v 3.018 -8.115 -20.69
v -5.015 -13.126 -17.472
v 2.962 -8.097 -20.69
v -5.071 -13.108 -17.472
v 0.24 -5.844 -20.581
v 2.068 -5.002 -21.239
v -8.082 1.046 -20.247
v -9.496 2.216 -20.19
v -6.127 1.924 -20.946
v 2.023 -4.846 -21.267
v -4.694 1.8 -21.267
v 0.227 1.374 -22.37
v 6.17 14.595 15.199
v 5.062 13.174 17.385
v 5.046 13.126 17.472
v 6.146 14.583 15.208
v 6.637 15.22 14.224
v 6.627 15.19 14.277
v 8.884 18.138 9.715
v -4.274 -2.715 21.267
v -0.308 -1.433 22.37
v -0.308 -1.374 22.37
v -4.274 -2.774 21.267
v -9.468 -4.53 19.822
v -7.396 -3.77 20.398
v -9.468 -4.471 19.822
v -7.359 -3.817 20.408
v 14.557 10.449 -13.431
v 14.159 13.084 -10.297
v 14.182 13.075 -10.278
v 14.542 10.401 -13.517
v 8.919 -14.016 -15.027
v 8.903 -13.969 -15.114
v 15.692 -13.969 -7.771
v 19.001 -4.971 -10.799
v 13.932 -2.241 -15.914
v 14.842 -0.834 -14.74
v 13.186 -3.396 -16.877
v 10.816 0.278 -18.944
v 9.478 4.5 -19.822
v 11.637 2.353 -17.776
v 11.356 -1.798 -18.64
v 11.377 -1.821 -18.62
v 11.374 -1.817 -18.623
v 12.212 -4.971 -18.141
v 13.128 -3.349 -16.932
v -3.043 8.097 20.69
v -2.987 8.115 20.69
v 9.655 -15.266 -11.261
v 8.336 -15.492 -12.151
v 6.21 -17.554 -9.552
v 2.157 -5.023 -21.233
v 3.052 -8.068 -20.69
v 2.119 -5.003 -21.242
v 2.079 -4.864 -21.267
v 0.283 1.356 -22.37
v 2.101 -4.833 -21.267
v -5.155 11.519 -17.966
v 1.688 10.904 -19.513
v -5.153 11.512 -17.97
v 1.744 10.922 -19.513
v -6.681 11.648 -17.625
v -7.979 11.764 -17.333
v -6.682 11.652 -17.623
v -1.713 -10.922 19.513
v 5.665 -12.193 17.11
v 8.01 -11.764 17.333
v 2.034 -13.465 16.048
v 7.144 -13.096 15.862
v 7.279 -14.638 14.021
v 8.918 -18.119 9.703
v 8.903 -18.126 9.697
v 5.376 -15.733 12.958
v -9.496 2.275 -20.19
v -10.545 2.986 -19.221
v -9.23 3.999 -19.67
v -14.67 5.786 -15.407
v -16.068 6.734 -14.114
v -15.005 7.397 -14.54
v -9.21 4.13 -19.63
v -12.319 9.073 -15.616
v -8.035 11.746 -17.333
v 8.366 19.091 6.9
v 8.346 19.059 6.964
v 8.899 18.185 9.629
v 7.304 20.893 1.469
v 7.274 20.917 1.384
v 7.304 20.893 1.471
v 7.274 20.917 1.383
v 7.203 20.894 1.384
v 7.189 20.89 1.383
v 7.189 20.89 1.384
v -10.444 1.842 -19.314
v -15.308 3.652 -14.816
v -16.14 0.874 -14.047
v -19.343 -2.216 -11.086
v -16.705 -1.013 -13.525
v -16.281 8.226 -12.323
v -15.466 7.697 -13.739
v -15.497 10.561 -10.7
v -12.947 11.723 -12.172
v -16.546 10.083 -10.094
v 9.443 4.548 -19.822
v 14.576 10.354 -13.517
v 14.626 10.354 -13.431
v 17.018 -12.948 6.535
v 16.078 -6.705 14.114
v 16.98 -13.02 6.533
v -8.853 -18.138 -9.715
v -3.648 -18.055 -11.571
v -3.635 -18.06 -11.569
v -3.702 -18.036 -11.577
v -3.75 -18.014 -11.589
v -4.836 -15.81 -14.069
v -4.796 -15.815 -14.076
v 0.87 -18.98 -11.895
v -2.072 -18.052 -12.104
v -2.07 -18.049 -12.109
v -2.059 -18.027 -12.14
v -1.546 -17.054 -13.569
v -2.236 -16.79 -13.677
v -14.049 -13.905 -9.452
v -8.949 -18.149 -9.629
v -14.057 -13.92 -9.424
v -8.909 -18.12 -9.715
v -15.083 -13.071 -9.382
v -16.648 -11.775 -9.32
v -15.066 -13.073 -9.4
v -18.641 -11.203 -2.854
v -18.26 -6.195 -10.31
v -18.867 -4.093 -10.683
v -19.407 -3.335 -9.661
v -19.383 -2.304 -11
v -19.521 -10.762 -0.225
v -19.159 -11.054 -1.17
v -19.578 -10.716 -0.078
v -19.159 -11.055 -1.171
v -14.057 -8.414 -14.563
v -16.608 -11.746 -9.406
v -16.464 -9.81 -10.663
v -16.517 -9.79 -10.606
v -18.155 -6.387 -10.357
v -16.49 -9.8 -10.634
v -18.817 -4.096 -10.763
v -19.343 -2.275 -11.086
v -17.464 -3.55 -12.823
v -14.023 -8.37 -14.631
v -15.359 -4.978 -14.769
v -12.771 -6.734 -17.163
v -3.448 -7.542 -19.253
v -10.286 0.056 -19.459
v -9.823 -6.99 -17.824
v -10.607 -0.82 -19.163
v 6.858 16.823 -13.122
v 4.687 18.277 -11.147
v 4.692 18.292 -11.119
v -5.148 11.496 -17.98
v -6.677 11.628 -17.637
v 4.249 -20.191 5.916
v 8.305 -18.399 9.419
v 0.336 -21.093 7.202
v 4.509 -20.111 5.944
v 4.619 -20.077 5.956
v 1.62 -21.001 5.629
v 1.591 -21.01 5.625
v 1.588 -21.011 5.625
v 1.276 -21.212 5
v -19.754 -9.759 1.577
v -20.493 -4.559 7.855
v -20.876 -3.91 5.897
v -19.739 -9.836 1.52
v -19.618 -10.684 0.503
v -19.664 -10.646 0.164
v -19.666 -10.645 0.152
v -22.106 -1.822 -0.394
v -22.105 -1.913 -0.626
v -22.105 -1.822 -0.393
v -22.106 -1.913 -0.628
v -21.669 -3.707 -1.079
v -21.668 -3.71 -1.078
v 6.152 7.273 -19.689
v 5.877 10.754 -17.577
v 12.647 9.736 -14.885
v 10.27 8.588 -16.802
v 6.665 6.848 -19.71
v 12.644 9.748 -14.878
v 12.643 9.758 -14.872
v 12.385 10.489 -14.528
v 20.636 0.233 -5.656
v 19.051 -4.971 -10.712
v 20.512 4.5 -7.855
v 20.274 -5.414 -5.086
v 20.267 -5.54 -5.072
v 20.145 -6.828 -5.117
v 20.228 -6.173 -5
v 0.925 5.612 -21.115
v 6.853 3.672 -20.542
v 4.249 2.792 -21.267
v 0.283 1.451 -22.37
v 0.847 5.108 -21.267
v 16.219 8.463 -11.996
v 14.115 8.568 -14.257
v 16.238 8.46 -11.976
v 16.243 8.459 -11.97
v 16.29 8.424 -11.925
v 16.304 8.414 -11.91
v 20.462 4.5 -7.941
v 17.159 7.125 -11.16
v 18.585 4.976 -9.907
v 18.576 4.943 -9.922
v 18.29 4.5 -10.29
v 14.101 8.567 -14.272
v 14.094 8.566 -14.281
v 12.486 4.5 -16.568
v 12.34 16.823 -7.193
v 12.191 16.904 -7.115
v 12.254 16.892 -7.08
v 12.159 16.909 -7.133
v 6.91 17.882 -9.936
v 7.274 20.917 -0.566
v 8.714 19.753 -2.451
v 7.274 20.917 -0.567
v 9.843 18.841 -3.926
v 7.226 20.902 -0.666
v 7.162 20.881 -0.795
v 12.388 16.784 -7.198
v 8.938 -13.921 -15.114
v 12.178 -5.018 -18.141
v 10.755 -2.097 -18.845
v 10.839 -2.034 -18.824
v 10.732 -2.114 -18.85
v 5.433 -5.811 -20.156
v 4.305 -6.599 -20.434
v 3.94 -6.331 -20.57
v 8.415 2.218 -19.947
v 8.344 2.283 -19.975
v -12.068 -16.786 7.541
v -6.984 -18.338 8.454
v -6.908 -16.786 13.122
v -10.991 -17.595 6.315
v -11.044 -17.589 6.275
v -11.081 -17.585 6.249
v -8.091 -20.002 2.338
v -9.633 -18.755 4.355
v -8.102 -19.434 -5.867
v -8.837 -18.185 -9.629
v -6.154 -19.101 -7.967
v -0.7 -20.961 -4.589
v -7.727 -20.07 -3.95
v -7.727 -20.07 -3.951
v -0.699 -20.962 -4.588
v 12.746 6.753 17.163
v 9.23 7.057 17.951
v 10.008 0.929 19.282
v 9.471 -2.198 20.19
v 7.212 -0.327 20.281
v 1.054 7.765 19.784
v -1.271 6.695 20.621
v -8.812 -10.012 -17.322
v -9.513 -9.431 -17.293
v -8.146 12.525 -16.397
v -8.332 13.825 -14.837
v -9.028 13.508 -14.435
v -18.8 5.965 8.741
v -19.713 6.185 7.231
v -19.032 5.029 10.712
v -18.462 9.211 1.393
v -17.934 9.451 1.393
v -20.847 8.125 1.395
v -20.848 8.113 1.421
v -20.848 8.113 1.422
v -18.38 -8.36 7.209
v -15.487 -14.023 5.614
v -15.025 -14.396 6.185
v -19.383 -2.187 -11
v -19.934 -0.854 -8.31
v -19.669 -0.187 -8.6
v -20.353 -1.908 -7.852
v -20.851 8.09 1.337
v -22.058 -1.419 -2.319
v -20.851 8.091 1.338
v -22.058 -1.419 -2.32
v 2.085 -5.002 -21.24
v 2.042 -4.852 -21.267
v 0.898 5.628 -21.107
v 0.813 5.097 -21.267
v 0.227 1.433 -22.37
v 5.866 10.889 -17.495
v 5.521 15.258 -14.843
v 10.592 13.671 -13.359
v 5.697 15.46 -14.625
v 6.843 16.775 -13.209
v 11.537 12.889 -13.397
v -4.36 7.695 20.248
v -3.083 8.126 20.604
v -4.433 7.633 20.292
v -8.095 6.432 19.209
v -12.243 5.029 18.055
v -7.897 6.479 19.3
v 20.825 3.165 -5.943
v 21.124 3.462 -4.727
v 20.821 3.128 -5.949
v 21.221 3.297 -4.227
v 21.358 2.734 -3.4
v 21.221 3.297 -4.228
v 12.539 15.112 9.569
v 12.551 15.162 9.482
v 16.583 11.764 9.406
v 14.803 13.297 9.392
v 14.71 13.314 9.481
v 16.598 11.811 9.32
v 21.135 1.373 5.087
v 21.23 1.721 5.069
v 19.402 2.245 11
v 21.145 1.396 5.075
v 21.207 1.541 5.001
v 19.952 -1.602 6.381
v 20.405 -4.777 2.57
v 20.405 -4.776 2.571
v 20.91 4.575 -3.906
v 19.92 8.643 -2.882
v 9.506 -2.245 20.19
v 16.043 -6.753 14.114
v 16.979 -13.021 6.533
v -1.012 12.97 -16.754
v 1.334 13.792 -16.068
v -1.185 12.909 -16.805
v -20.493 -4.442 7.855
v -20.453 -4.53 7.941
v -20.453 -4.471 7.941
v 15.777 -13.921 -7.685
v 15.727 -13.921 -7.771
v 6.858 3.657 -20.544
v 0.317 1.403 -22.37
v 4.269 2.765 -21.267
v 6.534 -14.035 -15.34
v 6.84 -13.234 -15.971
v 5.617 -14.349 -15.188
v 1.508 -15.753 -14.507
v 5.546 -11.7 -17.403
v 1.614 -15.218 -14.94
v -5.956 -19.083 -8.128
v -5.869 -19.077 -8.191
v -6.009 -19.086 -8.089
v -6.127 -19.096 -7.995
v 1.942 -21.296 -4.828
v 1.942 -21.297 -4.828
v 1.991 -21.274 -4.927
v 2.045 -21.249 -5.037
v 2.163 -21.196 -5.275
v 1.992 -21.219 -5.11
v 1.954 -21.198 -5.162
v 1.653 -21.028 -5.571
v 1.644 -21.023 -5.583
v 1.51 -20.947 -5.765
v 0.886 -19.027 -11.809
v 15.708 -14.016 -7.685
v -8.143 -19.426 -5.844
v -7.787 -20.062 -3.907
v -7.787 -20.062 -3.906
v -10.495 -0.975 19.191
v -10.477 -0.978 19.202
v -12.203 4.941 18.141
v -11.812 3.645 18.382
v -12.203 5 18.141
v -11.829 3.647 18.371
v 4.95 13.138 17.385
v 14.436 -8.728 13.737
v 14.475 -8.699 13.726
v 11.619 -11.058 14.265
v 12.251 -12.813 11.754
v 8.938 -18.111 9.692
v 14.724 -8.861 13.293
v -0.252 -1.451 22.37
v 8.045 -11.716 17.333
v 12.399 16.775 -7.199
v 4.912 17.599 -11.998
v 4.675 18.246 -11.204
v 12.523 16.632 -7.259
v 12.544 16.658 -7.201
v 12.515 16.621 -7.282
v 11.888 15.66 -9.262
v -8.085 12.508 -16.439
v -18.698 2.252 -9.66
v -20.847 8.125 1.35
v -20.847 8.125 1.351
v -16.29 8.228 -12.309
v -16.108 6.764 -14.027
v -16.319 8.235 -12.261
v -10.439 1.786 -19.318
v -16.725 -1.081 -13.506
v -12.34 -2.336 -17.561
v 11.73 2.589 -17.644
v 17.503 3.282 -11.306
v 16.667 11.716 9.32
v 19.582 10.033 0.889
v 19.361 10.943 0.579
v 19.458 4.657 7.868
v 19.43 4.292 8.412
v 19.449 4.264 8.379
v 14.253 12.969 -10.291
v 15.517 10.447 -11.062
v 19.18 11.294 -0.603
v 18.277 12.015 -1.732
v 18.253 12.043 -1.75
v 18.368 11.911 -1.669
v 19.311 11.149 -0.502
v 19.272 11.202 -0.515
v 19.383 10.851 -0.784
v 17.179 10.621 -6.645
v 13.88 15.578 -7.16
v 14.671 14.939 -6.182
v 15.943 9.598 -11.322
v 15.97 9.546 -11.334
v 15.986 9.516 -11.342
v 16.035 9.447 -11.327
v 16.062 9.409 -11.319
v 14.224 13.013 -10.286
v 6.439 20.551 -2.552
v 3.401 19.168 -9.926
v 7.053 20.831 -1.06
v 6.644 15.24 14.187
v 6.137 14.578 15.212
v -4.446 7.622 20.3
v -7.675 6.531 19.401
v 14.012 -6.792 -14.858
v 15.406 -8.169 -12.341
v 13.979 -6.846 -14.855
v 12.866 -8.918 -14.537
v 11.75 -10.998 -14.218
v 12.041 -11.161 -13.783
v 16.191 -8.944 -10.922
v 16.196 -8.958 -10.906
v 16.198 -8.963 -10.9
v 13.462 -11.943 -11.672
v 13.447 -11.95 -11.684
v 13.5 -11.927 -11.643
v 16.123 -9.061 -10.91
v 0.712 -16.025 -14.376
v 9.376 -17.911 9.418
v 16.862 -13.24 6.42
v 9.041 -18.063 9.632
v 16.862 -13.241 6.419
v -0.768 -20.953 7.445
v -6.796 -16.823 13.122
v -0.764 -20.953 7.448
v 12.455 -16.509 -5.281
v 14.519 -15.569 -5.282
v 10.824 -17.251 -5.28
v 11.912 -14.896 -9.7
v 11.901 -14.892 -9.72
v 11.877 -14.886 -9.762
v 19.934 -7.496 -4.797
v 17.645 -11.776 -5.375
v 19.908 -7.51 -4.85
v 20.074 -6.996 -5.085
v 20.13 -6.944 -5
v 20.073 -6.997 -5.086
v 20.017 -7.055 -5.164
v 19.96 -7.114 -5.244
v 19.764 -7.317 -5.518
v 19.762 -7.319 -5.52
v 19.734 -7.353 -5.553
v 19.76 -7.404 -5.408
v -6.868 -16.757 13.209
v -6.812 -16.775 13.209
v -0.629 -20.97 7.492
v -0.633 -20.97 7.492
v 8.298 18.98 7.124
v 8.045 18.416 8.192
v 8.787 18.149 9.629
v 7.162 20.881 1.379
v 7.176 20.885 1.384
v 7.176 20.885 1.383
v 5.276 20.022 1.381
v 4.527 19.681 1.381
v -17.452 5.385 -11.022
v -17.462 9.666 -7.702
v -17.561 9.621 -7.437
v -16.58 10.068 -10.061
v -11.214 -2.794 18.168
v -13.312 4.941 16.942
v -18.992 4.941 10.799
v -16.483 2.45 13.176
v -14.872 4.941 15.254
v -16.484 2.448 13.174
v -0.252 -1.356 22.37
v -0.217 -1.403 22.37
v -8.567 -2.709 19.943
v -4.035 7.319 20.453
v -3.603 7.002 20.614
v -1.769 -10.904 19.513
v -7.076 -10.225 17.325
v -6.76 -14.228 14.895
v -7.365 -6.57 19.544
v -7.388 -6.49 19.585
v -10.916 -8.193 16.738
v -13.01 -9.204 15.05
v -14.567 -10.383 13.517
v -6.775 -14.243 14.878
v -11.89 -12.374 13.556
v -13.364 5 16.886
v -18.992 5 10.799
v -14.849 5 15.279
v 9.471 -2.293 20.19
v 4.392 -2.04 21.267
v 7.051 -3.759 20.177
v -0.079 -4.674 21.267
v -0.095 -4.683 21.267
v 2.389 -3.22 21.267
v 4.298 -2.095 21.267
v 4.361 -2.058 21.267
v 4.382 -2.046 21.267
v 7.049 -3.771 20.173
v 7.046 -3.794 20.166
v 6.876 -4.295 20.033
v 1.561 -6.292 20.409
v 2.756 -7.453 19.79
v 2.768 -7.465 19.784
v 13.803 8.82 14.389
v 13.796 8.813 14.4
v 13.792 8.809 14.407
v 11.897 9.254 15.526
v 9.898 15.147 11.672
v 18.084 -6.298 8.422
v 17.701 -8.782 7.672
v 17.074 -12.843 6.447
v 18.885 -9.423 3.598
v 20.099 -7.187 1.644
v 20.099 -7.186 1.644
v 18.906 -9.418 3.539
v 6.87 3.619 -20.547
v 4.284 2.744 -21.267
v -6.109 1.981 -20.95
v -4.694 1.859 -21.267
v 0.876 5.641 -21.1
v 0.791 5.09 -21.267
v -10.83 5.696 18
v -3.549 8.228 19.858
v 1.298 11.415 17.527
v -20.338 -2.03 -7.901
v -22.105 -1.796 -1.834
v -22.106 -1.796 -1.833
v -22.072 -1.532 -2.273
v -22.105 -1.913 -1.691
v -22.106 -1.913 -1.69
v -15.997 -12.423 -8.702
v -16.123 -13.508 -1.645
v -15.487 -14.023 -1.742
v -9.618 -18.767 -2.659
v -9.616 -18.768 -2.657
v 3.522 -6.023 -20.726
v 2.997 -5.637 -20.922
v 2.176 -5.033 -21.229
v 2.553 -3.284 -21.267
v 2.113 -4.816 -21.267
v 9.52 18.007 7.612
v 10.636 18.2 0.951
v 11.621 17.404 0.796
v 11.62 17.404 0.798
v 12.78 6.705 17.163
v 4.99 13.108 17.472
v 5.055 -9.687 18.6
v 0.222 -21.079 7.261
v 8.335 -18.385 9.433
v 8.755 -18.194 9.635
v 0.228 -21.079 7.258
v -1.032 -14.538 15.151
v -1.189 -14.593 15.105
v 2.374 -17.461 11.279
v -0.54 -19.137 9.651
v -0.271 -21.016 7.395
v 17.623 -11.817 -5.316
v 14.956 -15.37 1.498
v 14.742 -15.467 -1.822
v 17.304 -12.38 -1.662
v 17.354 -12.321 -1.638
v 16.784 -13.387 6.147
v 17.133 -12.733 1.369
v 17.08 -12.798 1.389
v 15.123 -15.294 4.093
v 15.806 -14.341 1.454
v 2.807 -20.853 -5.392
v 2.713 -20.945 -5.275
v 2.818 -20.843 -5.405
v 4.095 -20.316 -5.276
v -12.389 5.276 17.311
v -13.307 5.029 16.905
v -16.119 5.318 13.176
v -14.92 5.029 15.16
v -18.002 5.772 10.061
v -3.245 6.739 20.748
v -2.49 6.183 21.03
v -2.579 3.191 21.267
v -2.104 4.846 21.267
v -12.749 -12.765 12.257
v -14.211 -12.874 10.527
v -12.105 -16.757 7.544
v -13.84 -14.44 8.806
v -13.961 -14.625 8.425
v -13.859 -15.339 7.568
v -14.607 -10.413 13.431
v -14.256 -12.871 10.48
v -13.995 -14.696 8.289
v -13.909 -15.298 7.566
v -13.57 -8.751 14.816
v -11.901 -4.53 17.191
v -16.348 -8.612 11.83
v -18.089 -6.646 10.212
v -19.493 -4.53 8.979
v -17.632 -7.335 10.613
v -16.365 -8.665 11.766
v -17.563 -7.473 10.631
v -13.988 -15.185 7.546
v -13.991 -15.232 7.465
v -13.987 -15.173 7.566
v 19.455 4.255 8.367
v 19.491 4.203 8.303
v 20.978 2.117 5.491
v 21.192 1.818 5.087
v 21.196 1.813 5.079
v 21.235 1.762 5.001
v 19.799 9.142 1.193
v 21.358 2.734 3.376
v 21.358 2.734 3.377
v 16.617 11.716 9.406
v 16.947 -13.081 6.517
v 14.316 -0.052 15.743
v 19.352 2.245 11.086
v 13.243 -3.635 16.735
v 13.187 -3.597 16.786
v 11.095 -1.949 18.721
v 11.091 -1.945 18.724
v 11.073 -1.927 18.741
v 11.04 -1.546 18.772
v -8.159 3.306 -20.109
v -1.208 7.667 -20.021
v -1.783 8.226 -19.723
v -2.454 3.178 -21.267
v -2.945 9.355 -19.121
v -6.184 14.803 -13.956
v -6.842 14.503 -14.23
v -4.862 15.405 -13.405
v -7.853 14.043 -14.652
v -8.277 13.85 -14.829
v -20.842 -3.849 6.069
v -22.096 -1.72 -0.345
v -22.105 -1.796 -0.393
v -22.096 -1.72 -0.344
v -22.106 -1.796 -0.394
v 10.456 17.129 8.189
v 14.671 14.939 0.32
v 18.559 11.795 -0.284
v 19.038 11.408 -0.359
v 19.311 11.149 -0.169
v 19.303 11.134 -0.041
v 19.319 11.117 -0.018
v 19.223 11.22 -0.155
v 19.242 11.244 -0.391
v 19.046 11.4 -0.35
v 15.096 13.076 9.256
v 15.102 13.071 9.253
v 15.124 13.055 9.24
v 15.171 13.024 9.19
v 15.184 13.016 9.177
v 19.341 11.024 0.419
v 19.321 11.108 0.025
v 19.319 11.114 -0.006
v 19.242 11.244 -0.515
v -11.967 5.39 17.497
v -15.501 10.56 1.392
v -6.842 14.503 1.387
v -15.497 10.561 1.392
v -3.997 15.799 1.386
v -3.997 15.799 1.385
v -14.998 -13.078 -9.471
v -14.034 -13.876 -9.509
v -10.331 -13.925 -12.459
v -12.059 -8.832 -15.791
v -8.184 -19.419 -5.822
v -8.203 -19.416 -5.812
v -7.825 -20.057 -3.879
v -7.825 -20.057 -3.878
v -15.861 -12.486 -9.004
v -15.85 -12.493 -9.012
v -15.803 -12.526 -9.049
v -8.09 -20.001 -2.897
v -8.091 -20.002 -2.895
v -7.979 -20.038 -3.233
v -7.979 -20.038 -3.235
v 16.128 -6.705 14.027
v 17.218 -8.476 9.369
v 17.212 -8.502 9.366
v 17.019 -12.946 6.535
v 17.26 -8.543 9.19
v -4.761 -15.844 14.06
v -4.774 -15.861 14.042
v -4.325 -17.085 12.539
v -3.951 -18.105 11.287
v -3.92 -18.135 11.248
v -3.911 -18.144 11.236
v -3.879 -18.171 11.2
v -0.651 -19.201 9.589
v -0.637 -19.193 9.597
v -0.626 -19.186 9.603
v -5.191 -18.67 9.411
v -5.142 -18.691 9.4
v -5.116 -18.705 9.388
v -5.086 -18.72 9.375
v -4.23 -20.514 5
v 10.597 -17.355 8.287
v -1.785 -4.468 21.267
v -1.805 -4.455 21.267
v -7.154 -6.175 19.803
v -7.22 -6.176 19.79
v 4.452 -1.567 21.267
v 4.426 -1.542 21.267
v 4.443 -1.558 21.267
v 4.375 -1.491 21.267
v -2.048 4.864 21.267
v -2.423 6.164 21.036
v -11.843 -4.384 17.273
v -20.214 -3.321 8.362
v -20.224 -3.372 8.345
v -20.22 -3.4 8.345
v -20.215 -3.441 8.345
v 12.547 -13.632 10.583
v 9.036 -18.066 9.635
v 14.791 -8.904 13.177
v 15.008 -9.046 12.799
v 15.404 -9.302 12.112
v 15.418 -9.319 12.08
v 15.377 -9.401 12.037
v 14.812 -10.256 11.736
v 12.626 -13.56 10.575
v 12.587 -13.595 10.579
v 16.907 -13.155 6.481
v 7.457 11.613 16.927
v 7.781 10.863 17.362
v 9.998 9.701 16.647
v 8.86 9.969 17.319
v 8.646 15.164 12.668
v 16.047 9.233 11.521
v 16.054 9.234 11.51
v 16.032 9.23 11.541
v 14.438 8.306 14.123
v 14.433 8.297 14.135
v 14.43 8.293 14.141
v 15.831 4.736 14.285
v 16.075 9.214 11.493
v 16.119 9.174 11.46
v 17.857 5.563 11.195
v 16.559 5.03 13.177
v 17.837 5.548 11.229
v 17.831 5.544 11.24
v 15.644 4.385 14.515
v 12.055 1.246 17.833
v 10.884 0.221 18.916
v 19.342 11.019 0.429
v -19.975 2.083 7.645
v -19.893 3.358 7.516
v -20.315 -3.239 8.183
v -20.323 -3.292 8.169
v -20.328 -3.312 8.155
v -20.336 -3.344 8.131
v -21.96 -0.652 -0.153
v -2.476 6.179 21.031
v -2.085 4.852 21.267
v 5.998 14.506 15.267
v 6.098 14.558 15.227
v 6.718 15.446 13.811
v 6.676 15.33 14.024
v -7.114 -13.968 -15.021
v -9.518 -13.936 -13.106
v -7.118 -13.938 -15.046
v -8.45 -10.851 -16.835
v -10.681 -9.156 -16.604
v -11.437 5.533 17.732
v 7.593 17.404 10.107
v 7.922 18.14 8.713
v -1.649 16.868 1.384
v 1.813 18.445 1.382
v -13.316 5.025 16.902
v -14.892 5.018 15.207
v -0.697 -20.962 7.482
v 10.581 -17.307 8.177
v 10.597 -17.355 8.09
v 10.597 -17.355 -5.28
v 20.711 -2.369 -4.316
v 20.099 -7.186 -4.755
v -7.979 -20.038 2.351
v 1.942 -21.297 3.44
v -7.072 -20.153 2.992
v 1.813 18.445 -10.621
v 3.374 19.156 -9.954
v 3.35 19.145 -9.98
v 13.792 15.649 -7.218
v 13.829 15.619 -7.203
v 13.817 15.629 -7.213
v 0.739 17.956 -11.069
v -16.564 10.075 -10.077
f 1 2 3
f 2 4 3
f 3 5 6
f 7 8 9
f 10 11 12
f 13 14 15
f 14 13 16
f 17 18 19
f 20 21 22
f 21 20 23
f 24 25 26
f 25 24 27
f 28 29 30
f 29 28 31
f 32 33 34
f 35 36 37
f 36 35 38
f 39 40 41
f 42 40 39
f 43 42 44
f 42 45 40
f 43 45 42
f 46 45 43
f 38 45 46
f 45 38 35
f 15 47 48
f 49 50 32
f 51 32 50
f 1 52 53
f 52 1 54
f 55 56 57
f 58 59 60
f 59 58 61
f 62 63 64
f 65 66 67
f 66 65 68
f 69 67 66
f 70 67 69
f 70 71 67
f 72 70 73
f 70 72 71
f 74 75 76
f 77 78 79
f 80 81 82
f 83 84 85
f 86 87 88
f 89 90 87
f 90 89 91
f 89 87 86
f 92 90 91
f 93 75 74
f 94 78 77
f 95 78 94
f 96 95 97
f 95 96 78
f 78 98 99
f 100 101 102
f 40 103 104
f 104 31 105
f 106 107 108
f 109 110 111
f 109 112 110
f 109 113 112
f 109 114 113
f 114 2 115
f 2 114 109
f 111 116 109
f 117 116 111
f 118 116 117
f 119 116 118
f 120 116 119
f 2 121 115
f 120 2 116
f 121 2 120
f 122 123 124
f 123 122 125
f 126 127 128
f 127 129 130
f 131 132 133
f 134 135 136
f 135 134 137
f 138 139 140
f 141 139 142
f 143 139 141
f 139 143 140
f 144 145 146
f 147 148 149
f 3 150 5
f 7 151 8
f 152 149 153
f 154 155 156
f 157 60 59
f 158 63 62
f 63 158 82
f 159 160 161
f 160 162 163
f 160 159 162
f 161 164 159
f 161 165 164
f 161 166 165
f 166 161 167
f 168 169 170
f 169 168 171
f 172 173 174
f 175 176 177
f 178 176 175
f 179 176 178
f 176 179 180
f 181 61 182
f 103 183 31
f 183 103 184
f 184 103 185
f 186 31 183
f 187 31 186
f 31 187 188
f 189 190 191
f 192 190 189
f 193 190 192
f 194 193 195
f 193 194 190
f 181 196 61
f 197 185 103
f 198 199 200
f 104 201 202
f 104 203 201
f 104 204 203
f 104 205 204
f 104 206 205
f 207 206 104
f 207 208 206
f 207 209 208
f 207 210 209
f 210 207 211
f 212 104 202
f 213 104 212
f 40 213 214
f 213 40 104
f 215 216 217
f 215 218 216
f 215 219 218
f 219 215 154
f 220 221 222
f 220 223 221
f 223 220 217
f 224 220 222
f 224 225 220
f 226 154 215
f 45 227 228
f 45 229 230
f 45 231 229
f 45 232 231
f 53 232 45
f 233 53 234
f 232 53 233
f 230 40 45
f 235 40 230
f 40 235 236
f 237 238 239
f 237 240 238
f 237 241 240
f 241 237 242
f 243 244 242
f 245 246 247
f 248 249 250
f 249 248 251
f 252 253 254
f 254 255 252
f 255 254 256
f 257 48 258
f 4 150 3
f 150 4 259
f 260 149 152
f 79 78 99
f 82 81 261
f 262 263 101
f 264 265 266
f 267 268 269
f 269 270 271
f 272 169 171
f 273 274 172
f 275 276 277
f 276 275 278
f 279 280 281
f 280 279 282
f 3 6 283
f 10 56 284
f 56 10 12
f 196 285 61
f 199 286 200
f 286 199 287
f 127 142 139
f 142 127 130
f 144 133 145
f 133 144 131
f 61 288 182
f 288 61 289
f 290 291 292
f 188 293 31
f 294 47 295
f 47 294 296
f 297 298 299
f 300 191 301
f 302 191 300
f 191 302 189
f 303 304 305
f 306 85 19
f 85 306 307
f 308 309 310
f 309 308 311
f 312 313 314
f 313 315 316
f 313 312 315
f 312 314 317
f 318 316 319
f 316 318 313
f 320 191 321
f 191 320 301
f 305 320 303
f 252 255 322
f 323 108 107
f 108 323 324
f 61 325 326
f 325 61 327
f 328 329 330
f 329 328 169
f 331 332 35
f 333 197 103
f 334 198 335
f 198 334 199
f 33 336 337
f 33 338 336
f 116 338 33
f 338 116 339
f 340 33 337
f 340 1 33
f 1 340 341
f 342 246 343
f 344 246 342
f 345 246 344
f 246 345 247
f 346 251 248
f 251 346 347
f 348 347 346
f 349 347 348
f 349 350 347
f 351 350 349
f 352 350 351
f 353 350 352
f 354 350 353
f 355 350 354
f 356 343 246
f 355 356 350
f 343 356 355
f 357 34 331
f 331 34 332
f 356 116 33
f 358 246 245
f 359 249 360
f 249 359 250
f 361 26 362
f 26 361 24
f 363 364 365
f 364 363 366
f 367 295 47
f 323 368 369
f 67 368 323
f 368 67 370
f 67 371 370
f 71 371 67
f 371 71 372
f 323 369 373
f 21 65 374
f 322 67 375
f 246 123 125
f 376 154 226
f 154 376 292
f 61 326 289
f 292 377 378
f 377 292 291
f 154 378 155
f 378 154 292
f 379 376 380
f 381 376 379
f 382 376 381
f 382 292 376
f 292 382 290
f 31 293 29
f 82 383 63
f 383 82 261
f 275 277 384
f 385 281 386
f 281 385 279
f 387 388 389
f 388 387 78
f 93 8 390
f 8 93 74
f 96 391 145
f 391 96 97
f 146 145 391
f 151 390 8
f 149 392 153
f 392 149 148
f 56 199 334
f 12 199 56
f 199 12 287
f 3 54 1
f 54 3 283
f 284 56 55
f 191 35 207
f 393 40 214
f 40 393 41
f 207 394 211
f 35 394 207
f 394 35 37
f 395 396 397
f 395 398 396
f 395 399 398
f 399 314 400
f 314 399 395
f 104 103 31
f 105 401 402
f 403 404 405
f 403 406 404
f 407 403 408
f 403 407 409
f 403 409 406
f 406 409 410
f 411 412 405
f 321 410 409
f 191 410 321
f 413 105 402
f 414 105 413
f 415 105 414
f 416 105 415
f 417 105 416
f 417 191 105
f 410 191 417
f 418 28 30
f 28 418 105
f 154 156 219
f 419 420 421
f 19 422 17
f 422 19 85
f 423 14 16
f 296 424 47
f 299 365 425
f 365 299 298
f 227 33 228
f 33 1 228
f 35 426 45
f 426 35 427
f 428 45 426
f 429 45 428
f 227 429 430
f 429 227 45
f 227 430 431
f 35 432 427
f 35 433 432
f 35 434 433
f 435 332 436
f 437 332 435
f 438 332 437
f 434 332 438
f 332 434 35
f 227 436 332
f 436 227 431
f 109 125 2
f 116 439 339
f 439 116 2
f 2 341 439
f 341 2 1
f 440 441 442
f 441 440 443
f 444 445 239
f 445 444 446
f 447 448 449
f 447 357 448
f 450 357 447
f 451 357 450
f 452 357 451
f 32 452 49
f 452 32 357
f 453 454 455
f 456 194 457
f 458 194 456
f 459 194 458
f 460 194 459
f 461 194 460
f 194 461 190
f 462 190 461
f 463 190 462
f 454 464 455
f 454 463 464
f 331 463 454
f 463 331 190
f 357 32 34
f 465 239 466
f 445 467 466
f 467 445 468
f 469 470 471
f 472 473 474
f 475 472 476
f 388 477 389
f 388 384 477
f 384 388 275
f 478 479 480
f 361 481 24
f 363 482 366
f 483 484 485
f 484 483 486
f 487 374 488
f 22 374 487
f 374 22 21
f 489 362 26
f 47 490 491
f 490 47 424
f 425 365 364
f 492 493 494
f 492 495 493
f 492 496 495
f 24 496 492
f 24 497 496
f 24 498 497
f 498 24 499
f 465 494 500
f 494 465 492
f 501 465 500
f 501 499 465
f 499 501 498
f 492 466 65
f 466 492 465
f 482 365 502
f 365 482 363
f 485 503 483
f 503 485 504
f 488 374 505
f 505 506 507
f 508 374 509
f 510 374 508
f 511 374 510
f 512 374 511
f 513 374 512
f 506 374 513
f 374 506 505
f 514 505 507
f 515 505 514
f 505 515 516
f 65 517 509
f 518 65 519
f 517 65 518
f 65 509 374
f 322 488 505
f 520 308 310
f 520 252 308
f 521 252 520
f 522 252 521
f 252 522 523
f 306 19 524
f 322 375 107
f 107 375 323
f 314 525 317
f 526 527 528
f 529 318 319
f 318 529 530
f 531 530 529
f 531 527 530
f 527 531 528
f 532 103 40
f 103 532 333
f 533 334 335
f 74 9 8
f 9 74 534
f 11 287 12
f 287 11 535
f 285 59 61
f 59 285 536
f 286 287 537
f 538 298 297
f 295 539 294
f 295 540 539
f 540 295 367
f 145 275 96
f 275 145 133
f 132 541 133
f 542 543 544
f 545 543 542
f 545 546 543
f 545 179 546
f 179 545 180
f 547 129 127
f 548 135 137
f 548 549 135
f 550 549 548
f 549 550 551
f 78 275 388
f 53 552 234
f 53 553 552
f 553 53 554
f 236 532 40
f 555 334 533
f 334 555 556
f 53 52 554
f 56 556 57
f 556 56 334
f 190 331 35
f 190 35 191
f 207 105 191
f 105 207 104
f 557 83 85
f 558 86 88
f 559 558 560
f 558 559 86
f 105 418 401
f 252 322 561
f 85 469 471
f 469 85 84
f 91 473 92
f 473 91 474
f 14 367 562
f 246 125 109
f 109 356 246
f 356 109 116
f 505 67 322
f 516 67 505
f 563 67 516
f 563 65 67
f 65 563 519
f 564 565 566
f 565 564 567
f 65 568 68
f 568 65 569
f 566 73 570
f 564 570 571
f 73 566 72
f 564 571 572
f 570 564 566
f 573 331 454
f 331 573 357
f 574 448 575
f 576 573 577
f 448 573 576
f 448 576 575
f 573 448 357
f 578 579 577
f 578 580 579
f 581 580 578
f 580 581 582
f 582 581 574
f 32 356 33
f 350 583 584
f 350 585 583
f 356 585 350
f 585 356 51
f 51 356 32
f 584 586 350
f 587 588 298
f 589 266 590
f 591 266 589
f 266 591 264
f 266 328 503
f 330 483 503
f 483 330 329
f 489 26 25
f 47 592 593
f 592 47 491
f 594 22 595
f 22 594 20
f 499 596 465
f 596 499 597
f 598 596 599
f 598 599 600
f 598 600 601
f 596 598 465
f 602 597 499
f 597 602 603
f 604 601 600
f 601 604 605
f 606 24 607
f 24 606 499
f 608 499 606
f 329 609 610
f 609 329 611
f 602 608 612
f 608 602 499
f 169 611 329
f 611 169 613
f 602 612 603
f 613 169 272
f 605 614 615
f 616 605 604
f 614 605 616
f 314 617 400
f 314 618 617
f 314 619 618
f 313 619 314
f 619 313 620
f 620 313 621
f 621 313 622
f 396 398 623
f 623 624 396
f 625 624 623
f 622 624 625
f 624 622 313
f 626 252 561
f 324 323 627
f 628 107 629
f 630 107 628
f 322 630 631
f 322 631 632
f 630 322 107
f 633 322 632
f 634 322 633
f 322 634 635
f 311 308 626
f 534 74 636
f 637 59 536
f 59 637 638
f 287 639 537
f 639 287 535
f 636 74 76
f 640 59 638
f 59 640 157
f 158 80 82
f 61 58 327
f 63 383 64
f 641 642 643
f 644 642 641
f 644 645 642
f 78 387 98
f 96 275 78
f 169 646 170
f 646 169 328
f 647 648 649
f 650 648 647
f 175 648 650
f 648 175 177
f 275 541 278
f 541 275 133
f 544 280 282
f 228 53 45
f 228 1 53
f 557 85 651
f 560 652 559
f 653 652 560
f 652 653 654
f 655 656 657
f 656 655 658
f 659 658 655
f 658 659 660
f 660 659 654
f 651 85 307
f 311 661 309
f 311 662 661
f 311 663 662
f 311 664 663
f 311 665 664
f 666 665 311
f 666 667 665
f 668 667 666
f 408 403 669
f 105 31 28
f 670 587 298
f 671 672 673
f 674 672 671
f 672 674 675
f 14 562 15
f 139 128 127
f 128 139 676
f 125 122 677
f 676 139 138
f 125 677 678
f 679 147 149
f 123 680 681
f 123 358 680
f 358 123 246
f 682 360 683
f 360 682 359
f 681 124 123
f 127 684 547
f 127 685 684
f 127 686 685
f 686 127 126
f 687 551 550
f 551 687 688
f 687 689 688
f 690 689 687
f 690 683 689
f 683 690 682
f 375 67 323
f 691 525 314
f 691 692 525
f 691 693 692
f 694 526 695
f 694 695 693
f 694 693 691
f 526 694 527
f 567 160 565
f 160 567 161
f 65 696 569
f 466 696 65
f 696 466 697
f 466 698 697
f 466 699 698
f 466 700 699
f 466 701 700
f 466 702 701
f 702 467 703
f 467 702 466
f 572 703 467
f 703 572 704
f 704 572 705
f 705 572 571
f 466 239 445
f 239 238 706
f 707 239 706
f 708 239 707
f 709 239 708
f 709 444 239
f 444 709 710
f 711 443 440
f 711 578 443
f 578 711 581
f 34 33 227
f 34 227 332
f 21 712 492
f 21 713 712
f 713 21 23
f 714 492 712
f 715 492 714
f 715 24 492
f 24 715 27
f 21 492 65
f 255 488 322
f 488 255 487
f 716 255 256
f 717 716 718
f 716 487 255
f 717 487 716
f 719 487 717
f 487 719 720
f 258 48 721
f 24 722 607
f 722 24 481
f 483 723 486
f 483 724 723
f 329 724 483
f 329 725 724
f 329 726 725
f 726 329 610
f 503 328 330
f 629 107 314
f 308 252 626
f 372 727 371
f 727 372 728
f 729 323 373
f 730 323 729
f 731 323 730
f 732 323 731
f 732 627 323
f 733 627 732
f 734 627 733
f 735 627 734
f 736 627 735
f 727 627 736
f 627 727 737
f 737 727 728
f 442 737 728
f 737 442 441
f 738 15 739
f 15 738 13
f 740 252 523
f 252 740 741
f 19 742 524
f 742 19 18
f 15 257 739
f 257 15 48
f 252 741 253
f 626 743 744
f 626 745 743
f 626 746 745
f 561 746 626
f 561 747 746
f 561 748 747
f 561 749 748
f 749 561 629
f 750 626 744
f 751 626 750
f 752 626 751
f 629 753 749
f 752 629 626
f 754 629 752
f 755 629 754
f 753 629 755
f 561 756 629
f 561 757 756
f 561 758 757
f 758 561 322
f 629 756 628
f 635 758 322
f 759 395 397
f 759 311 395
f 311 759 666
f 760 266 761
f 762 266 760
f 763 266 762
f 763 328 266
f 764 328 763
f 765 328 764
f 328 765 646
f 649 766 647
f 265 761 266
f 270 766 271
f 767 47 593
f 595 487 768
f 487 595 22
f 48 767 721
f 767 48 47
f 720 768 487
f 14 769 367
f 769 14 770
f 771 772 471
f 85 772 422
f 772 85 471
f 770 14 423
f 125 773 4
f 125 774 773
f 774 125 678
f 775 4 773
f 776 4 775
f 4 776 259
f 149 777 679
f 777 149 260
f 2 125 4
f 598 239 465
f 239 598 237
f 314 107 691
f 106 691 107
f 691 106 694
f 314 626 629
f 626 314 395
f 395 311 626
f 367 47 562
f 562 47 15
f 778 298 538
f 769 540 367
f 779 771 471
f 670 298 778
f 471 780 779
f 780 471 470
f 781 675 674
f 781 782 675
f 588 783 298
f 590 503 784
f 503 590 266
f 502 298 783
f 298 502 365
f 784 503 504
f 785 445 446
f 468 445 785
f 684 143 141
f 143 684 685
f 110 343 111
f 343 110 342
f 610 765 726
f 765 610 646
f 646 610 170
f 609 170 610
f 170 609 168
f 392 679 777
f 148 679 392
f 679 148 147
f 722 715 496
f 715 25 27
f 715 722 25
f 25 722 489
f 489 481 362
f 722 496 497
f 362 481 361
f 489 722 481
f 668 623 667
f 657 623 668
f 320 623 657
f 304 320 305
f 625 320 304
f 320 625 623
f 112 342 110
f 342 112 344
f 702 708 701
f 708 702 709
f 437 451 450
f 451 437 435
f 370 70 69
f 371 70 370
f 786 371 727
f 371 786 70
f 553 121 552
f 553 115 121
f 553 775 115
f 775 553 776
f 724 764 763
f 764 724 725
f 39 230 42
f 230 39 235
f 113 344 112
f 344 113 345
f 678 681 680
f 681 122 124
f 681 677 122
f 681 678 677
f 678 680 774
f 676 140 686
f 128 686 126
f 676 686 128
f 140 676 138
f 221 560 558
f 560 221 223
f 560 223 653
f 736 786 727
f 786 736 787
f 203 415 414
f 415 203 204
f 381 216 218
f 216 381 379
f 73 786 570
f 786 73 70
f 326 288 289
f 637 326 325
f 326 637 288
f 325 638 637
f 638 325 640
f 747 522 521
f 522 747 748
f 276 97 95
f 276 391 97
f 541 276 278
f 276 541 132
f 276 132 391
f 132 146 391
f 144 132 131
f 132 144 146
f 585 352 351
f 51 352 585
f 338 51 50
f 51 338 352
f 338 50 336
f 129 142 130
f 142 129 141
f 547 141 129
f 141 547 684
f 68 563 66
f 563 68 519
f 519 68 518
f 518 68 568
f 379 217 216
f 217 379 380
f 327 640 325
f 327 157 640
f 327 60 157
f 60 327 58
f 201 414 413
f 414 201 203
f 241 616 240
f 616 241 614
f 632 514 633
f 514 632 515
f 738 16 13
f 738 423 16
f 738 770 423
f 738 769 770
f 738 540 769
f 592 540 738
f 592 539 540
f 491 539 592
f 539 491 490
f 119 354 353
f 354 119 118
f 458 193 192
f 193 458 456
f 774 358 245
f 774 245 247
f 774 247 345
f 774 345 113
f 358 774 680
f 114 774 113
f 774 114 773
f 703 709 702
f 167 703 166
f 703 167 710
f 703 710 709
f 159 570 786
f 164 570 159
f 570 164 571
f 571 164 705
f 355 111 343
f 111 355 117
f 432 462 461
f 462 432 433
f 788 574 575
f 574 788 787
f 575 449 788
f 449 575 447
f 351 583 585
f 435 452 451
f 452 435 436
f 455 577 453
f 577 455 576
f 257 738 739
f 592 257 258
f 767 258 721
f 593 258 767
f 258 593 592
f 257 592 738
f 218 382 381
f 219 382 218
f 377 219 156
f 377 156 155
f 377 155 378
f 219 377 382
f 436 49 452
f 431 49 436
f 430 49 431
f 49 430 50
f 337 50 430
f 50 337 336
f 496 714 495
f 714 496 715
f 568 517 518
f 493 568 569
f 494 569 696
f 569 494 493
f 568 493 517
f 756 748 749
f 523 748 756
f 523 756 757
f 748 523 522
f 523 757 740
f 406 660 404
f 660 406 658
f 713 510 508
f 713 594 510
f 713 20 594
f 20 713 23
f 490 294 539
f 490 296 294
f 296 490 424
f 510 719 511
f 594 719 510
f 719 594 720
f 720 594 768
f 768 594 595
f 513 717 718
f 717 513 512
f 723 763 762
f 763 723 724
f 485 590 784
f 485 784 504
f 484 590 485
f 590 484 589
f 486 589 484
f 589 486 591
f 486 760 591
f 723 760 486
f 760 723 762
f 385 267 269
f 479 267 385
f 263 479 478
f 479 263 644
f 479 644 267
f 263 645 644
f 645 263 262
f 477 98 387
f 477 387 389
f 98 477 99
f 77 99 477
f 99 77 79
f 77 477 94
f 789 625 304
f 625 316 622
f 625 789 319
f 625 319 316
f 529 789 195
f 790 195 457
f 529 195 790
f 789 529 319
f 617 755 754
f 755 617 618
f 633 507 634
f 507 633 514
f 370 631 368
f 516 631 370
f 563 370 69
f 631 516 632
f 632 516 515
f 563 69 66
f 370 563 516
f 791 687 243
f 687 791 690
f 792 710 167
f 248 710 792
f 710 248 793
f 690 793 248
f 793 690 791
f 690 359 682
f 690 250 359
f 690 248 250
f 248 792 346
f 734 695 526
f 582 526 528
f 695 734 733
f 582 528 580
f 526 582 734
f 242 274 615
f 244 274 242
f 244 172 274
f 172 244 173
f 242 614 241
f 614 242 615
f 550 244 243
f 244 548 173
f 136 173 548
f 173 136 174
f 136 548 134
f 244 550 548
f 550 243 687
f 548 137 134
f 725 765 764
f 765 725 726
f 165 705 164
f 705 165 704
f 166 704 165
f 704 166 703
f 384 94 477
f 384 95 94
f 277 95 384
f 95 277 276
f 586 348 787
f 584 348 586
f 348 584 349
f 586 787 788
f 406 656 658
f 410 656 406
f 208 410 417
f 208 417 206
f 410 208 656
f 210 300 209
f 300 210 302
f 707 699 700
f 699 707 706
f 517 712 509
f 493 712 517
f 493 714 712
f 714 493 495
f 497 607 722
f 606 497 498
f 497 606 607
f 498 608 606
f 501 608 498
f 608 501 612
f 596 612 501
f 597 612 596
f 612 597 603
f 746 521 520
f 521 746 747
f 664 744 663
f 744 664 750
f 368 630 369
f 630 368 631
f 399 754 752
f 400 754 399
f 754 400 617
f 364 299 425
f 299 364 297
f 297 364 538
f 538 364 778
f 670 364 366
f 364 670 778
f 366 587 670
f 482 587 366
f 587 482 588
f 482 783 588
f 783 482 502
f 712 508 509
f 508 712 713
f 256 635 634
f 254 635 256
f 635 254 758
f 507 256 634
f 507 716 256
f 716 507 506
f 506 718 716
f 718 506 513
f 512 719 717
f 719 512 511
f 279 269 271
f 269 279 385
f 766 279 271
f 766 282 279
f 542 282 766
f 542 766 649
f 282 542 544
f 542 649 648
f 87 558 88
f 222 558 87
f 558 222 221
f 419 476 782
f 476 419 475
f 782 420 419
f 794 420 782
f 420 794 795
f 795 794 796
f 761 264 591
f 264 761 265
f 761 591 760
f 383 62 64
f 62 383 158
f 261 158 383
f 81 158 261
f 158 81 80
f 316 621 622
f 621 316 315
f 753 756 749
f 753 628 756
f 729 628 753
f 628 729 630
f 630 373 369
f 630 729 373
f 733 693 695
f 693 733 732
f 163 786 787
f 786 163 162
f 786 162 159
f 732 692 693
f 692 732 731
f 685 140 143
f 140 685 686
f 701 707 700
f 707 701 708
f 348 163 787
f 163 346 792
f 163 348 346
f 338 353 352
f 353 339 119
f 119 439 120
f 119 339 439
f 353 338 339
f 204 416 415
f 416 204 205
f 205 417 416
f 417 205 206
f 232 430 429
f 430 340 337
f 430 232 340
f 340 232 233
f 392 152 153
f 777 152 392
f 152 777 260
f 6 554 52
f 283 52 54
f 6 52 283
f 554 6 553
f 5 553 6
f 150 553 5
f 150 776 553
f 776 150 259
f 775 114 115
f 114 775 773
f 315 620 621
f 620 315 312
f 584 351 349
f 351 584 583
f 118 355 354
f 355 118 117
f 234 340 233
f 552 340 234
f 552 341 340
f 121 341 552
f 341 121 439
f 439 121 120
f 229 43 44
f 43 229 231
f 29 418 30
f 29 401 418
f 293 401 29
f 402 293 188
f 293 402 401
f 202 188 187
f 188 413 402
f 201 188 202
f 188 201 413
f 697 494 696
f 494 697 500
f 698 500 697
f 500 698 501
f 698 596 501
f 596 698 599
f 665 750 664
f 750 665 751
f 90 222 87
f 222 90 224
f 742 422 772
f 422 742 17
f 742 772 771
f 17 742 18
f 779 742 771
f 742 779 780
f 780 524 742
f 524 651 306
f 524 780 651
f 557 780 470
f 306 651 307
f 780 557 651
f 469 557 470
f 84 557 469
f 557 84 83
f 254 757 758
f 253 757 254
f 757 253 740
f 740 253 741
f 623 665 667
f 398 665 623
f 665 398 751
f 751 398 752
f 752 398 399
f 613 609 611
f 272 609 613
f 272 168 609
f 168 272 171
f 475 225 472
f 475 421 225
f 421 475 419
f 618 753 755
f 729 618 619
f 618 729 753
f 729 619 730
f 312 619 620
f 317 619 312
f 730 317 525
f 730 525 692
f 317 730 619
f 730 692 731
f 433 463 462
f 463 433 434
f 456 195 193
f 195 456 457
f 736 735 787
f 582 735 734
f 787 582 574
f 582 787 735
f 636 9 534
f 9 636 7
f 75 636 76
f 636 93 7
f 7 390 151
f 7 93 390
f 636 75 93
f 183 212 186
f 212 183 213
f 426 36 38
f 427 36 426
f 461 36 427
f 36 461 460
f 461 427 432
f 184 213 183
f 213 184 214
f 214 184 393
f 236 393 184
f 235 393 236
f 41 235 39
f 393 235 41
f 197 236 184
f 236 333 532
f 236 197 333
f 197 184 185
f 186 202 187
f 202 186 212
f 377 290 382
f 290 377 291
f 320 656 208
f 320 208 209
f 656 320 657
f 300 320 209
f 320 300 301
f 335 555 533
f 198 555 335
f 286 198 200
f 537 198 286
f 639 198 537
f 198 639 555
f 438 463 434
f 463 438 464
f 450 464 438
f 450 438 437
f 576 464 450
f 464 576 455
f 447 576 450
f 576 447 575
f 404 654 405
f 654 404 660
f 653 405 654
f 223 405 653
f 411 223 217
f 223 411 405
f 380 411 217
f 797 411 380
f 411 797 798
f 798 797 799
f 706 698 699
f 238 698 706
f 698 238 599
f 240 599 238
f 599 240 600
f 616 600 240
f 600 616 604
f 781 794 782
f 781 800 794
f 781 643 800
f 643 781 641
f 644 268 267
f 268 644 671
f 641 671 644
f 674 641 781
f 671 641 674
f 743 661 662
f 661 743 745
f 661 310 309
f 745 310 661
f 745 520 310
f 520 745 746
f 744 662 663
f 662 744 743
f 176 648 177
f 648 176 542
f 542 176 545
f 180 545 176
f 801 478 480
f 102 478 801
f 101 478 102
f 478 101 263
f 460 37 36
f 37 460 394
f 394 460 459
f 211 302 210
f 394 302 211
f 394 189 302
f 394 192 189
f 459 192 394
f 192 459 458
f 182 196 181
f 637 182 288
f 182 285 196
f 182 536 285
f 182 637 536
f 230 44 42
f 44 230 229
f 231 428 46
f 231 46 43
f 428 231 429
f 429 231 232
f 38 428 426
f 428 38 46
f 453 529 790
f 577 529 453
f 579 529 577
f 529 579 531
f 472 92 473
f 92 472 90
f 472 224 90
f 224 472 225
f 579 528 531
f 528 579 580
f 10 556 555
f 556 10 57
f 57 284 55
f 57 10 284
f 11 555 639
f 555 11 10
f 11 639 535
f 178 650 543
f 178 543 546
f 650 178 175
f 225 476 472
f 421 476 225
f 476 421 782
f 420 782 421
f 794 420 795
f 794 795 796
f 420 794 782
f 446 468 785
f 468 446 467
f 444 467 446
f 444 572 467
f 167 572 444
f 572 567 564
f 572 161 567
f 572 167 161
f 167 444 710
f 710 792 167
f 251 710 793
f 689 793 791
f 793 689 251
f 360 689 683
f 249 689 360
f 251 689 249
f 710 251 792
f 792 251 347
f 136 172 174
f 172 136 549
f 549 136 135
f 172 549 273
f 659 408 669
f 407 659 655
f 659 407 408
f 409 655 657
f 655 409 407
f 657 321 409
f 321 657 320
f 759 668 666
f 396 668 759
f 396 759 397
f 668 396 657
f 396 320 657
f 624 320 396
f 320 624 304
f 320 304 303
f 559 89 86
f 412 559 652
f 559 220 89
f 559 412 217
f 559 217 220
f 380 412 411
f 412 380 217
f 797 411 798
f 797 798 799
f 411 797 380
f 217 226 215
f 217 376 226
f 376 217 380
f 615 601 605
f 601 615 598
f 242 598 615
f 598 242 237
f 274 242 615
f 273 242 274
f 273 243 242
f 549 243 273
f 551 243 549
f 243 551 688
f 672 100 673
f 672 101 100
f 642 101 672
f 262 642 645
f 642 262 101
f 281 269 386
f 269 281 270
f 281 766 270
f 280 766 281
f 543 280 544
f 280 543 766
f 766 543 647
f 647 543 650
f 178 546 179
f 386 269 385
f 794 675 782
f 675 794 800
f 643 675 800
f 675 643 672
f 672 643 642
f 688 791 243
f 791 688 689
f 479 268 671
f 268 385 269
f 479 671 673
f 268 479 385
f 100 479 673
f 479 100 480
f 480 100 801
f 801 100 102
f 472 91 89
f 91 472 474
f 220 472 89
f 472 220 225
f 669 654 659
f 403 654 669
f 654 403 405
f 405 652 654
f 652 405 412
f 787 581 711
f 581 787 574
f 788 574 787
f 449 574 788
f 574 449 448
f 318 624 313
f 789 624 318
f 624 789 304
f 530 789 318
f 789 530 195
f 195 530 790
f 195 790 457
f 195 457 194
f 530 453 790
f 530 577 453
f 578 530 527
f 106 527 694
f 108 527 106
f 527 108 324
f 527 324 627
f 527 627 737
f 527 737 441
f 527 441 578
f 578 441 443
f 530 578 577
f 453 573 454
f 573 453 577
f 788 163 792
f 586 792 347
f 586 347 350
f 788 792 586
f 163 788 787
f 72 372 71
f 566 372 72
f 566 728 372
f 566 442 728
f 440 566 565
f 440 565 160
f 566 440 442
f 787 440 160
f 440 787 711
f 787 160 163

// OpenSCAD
// Auto-generated OpenSCAD file

    inner_points = 10*[[-0.6761707289295088, 1.4443912429777448, 1.6180428150467039], [1.2603258031723903, -0.12076505073214727, -1.8089878045154844], [-0.4714605992542724, 0.6029023975518815, 2.1180331007845328], [1.465035932847627, -0.9622538961580105, -1.3089975187776557], [-1.541683511369511, 1.050210284169558, 1.3089975187776557], [0.3948130207323881, -0.514946009540334, -2.1180331007845328], [-1.3369733816942744, 0.20872143874369475, 1.8089878045154844], [0.5995231504076245, -1.3564348549661973, -1.6180428150467039], [1.463934226922532, 1.4843529255560477, 0.8090793922871596], [1.921079046691184, 1.1148696448288868, 6.720509726276802e-05], [1.6686443565977682, 0.6428640801301844, 1.3090696780249882], [2.12578917636642, 0.2733807994030234, 0.5000574908350913], [-2.202436754888304, -0.18542441139147592, -0.5000574908350913], [-1.7452919351196523, -0.5549076921186369, -1.3090696780249882], [-1.997726625213068, -1.0269132568173394, -6.720509726276802e-05], [-1.540581805444416, -1.3963965375445002, -0.8090793922871596], [0.18942199934983583, 1.838629008812172, -1.308979864697917], [0.5994432045682823, -1.3564916619924376, 1.6180251609669651], [1.0565880243369343, -1.7259749427195985, 0.8090129737770685], [-0.6760907830901666, 1.4444480500039851, -1.6180251609669651], [-0.26606957787172014, -1.7506726208006245, 1.308979864697917], [0.1910752418969318, -2.1201559015277853, 0.49996767750802007], [0.5206899199254378, 0.4770998592723383, -2.118012576336173], [-0.5973374984473221, -0.3891434712607908, 2.118012576336173], [1.0566279972566053, -1.7259465392064783, -0.8090210142297662], [0.9289932050541309, 1.2407181409580579, 1.6180788946703704], [2.1258138809894067, 0.2733983537395316, -0.49994250870567225], [-2.202461459511291, -0.1854419657279841, 0.49994250870567225], [-1.005640783576015, -1.1527617529465104, -1.6180788946703704], [0.7243230482985655, 2.082235389897041, -0.4999453790742929], [1.4649712553049694, -0.9622998540076386, 1.3090364687699425], [-1.5416188338268535, 1.050256242019186, -1.3090364687699425], [-0.8009706268204498, -1.9942790018854937, 0.4999453790742929], [0.18935732180717835, 1.8385830509625434, 1.3090541228496813], [1.6687090341404256, 0.6429100379798126, -1.3089643095226098], [0.5205852694631093, 0.47702549790959015, 2.1180553992182594], [1.9999369817963566, -0.7186475150731406, -0.4999630331540315], [-2.0765845603182407, 0.8066039030846881, 0.4999630331540315], [-0.5972328479849937, -0.38906910989804266, -2.1180553992182594], [-1.7453566126623097, -0.5549536499682651, 1.3089643095226098], [-0.26600490032906265, -1.750626662950996, -1.3090541228496813], [0.7242983436755794, 2.082217835560533, 0.5000546204664706], [1.463974199842203, 1.4843813290691679, -0.8089545957196747], [1.260236421006747, -0.12082856291828337, 1.8090461825728774], [1.9999122771733702, -0.7186650694096489, 0.5000369663867321], [-2.0765598556952543, 0.8066214574211964, -0.5000369663867321], [-1.336883999528631, 0.20878495092983085, -1.8090461825728774], [-1.540621778364087, -1.3964249410576204, 0.8089545957196747], [-0.8009459221974637, -1.9942614475489857, -0.5000546204664706], [0.9290731508934732, 1.2407749479842982, -1.6179890813432987], [0.39470837027005956, -0.5150203709030822, 2.1180348747699], [1.591529046205335, -1.4823401581216085, 1.3471393857822367e-05], [-0.47135594879194387, 0.6029767589146297, -2.1180348747699], [-1.0057207294153574, -1.1528185599727507, 1.6179890813432987], [0.19109994651991802, -2.120138347191277, -0.5000323220327436]];

    outer_points = 10*[[0.02552547509395009, 2.1187272483769695, -0.7045645993136277], [-1.3615932646610294, -1.6727578892770014, 0.5779384076102413], [0.6827172728374509, 1.6727578892770014, -1.3121913529400864], [-0.7044014669175285, -2.1187272483769695, -0.029688346016217504], [0.7044014669175285, 2.1187272483769695, 0.029688346016217504], [-0.6827172728374509, -1.6727578892770014, 1.3121913529400864], [1.3615932646610294, 1.6727578892770014, -0.5779384076102413], [-0.02552547509395009, -2.1187272483769695, 0.7045645993136277], [-1.6027511659773777, 0.6705087936332265, -1.4027382632260594], [-1.9302054814233927, -0.22453943453325823, -1.099980372244143], [-0.945559368233877, 0.22453943453325823, -2.0103650168525182], [-1.273013683679892, -0.6705087936332265, -1.7076071258706018], [1.273013683679892, 0.6705087936332265, 1.7076071258706018], [0.945559368233877, -0.22453943453325823, 2.0103650168525182], [1.9302054814233927, 0.22453943453325823, 1.099980372244143], [1.6027511659773777, -0.6705087936332265, 1.4027382632260594], [-1.8951197183831776, 0.4970541464314976, 1.0712265894806337], [1.2162437265595991, -0.4970541464314976, -1.8054795348104788], [0.8887894111135841, -1.3921023745979824, -1.5027216438285624], [-1.2162437265595991, 0.4970541464314976, 1.8054795348104788], [1.8951197183831776, -0.4970541464314976, -1.0712265894806337], [1.5676654029371626, -1.3921023745979824, -0.7684686984987172], [-1.4526456533333216, -1.0353759855059943, 1.3430879167013183], [1.4526456533333216, 1.0353759855059943, -1.3430879167013183], [0.26790481028680946, -2.2029389255707184, -0.24769957676650906], [-0.7994549424817525, 1.1716333414551139, -1.7245912807479955], [-1.6567414700822498, -1.1716333414551139, -0.9319608317951029], [1.6567414700822498, 1.1716333414551139, 0.9319608317951029], [0.7994549424817525, -1.1716333414551139, 1.7245912807479955], [-2.077531341052028, 0.8067661495823462, 0.13805753994051662], [0.3002109203116041, -0.8067661495823462, -2.06035670715377], [-0.3002109203116041, 0.8067661495823462, 2.06035670715377], [2.077531341052028, -0.8067661495823462, -0.13805753994051662], [-0.8905073311540451, 1.809015245226121, -0.9594417716569185], [-1.9501717554630091, -1.0874216642613652, 0.020303344285033886], [0.1728513347225853, 1.0874216642613652, -1.9426025114982872], [-0.8868130895863787, -1.809015245226121, -0.9628573955563348], [0.8868130895863787, 1.809015245226121, 0.9628573955563348], [-0.1728513347225853, -1.0874216642613652, 1.9426025114982872], [1.9501717554630091, 1.0874216642613652, -0.020303344285033886], [0.8905073311540451, -1.809015245226121, 0.9594417716569185], [-1.6938035546496701, 1.3078906974042335, -0.6375887541349824], [-2.2236357668041524, -0.14032775733950953, -0.1477161961640061], [0.02674690897046106, 0.14032775733950953, -2.22837624760281], [-0.503085303184021, -1.3078906974042335, -1.7385036896318335], [0.503085303184021, 1.3078906974042335, 1.7385036896318335], [-0.02674690897046106, -0.14032775733950953, 2.22837624760281], [2.2236357668041524, 0.14032775733950953, 0.1477161961640061], [1.6938035546496701, -1.3078906974042335, 0.6375887541349824], [-2.041224144135302, -0.4500397604903581, 0.7854528533761111], [0.9427797152184564, 0.4500397604903581, -1.9734990752595192], [0.0854931876179591, -1.8932269224198697, -1.1808686263066264], [-0.9427797152184564, -0.4500397604903581, 1.9734990752595192], [2.041224144135302, 0.4500397604903581, -0.7854528533761111], [1.1839376165348048, -1.8932269224198697, 0.00717759557678177]];

    // Convex hull for inner set (I)
    module inner_hull() {
        hull() {
            for (p = inner_points) {
                translate(p) sphere(r=0.1);
            }
        }
    }

    // Convex hull for outer set (O) minus inner hull (O \ I)
    module outer_minus_inner() {
        difference() {
            hull() {
                for (p = outer_points) {
                    translate(p) sphere(r=0.1);
                }
            }
            inner_hull(); // Subtract inner hull
        }
    }

    // Convex hull for outer set (O) minus all translated inner hulls
    module outer_minus_AllTranslationInner() {
        difference() {
            hull() {
                for (p = outer_points) {
                    translate(p) sphere(r=0.1);
                }
            }
            hull() {
                translate([0,0,50]) inner_hull();
                translate([0,0,-50]) inner_hull();
            }; // Subtract translated inner hulls
        }
    }

    // Difference between outer_minus_inner and outer_minus_AllTranslationInner
    module outer_minus_inner_diff() {
        difference() {
            // Outer minus inner
            difference() {
                hull() {
                    for (p = outer_points) {
                        translate(p) sphere(r=0.1);
                    }
                }
                inner_hull();
            }

            // Subtract Outer minus AllTranslationInner
            difference() {
                hull() {
                    for (p = outer_points) {
                        translate(p) sphere(r=0.1);
                    }
                }
                hull() {
                    translate([0,0,50]) inner_hull();
                    translate([0,0,-50]) inner_hull();
                };
            }
        }
    }

    // Rendering all with colors applied
    color([1, 1, 0, 1]) outer_minus_inner_diff(); // Opaque yellow
    
